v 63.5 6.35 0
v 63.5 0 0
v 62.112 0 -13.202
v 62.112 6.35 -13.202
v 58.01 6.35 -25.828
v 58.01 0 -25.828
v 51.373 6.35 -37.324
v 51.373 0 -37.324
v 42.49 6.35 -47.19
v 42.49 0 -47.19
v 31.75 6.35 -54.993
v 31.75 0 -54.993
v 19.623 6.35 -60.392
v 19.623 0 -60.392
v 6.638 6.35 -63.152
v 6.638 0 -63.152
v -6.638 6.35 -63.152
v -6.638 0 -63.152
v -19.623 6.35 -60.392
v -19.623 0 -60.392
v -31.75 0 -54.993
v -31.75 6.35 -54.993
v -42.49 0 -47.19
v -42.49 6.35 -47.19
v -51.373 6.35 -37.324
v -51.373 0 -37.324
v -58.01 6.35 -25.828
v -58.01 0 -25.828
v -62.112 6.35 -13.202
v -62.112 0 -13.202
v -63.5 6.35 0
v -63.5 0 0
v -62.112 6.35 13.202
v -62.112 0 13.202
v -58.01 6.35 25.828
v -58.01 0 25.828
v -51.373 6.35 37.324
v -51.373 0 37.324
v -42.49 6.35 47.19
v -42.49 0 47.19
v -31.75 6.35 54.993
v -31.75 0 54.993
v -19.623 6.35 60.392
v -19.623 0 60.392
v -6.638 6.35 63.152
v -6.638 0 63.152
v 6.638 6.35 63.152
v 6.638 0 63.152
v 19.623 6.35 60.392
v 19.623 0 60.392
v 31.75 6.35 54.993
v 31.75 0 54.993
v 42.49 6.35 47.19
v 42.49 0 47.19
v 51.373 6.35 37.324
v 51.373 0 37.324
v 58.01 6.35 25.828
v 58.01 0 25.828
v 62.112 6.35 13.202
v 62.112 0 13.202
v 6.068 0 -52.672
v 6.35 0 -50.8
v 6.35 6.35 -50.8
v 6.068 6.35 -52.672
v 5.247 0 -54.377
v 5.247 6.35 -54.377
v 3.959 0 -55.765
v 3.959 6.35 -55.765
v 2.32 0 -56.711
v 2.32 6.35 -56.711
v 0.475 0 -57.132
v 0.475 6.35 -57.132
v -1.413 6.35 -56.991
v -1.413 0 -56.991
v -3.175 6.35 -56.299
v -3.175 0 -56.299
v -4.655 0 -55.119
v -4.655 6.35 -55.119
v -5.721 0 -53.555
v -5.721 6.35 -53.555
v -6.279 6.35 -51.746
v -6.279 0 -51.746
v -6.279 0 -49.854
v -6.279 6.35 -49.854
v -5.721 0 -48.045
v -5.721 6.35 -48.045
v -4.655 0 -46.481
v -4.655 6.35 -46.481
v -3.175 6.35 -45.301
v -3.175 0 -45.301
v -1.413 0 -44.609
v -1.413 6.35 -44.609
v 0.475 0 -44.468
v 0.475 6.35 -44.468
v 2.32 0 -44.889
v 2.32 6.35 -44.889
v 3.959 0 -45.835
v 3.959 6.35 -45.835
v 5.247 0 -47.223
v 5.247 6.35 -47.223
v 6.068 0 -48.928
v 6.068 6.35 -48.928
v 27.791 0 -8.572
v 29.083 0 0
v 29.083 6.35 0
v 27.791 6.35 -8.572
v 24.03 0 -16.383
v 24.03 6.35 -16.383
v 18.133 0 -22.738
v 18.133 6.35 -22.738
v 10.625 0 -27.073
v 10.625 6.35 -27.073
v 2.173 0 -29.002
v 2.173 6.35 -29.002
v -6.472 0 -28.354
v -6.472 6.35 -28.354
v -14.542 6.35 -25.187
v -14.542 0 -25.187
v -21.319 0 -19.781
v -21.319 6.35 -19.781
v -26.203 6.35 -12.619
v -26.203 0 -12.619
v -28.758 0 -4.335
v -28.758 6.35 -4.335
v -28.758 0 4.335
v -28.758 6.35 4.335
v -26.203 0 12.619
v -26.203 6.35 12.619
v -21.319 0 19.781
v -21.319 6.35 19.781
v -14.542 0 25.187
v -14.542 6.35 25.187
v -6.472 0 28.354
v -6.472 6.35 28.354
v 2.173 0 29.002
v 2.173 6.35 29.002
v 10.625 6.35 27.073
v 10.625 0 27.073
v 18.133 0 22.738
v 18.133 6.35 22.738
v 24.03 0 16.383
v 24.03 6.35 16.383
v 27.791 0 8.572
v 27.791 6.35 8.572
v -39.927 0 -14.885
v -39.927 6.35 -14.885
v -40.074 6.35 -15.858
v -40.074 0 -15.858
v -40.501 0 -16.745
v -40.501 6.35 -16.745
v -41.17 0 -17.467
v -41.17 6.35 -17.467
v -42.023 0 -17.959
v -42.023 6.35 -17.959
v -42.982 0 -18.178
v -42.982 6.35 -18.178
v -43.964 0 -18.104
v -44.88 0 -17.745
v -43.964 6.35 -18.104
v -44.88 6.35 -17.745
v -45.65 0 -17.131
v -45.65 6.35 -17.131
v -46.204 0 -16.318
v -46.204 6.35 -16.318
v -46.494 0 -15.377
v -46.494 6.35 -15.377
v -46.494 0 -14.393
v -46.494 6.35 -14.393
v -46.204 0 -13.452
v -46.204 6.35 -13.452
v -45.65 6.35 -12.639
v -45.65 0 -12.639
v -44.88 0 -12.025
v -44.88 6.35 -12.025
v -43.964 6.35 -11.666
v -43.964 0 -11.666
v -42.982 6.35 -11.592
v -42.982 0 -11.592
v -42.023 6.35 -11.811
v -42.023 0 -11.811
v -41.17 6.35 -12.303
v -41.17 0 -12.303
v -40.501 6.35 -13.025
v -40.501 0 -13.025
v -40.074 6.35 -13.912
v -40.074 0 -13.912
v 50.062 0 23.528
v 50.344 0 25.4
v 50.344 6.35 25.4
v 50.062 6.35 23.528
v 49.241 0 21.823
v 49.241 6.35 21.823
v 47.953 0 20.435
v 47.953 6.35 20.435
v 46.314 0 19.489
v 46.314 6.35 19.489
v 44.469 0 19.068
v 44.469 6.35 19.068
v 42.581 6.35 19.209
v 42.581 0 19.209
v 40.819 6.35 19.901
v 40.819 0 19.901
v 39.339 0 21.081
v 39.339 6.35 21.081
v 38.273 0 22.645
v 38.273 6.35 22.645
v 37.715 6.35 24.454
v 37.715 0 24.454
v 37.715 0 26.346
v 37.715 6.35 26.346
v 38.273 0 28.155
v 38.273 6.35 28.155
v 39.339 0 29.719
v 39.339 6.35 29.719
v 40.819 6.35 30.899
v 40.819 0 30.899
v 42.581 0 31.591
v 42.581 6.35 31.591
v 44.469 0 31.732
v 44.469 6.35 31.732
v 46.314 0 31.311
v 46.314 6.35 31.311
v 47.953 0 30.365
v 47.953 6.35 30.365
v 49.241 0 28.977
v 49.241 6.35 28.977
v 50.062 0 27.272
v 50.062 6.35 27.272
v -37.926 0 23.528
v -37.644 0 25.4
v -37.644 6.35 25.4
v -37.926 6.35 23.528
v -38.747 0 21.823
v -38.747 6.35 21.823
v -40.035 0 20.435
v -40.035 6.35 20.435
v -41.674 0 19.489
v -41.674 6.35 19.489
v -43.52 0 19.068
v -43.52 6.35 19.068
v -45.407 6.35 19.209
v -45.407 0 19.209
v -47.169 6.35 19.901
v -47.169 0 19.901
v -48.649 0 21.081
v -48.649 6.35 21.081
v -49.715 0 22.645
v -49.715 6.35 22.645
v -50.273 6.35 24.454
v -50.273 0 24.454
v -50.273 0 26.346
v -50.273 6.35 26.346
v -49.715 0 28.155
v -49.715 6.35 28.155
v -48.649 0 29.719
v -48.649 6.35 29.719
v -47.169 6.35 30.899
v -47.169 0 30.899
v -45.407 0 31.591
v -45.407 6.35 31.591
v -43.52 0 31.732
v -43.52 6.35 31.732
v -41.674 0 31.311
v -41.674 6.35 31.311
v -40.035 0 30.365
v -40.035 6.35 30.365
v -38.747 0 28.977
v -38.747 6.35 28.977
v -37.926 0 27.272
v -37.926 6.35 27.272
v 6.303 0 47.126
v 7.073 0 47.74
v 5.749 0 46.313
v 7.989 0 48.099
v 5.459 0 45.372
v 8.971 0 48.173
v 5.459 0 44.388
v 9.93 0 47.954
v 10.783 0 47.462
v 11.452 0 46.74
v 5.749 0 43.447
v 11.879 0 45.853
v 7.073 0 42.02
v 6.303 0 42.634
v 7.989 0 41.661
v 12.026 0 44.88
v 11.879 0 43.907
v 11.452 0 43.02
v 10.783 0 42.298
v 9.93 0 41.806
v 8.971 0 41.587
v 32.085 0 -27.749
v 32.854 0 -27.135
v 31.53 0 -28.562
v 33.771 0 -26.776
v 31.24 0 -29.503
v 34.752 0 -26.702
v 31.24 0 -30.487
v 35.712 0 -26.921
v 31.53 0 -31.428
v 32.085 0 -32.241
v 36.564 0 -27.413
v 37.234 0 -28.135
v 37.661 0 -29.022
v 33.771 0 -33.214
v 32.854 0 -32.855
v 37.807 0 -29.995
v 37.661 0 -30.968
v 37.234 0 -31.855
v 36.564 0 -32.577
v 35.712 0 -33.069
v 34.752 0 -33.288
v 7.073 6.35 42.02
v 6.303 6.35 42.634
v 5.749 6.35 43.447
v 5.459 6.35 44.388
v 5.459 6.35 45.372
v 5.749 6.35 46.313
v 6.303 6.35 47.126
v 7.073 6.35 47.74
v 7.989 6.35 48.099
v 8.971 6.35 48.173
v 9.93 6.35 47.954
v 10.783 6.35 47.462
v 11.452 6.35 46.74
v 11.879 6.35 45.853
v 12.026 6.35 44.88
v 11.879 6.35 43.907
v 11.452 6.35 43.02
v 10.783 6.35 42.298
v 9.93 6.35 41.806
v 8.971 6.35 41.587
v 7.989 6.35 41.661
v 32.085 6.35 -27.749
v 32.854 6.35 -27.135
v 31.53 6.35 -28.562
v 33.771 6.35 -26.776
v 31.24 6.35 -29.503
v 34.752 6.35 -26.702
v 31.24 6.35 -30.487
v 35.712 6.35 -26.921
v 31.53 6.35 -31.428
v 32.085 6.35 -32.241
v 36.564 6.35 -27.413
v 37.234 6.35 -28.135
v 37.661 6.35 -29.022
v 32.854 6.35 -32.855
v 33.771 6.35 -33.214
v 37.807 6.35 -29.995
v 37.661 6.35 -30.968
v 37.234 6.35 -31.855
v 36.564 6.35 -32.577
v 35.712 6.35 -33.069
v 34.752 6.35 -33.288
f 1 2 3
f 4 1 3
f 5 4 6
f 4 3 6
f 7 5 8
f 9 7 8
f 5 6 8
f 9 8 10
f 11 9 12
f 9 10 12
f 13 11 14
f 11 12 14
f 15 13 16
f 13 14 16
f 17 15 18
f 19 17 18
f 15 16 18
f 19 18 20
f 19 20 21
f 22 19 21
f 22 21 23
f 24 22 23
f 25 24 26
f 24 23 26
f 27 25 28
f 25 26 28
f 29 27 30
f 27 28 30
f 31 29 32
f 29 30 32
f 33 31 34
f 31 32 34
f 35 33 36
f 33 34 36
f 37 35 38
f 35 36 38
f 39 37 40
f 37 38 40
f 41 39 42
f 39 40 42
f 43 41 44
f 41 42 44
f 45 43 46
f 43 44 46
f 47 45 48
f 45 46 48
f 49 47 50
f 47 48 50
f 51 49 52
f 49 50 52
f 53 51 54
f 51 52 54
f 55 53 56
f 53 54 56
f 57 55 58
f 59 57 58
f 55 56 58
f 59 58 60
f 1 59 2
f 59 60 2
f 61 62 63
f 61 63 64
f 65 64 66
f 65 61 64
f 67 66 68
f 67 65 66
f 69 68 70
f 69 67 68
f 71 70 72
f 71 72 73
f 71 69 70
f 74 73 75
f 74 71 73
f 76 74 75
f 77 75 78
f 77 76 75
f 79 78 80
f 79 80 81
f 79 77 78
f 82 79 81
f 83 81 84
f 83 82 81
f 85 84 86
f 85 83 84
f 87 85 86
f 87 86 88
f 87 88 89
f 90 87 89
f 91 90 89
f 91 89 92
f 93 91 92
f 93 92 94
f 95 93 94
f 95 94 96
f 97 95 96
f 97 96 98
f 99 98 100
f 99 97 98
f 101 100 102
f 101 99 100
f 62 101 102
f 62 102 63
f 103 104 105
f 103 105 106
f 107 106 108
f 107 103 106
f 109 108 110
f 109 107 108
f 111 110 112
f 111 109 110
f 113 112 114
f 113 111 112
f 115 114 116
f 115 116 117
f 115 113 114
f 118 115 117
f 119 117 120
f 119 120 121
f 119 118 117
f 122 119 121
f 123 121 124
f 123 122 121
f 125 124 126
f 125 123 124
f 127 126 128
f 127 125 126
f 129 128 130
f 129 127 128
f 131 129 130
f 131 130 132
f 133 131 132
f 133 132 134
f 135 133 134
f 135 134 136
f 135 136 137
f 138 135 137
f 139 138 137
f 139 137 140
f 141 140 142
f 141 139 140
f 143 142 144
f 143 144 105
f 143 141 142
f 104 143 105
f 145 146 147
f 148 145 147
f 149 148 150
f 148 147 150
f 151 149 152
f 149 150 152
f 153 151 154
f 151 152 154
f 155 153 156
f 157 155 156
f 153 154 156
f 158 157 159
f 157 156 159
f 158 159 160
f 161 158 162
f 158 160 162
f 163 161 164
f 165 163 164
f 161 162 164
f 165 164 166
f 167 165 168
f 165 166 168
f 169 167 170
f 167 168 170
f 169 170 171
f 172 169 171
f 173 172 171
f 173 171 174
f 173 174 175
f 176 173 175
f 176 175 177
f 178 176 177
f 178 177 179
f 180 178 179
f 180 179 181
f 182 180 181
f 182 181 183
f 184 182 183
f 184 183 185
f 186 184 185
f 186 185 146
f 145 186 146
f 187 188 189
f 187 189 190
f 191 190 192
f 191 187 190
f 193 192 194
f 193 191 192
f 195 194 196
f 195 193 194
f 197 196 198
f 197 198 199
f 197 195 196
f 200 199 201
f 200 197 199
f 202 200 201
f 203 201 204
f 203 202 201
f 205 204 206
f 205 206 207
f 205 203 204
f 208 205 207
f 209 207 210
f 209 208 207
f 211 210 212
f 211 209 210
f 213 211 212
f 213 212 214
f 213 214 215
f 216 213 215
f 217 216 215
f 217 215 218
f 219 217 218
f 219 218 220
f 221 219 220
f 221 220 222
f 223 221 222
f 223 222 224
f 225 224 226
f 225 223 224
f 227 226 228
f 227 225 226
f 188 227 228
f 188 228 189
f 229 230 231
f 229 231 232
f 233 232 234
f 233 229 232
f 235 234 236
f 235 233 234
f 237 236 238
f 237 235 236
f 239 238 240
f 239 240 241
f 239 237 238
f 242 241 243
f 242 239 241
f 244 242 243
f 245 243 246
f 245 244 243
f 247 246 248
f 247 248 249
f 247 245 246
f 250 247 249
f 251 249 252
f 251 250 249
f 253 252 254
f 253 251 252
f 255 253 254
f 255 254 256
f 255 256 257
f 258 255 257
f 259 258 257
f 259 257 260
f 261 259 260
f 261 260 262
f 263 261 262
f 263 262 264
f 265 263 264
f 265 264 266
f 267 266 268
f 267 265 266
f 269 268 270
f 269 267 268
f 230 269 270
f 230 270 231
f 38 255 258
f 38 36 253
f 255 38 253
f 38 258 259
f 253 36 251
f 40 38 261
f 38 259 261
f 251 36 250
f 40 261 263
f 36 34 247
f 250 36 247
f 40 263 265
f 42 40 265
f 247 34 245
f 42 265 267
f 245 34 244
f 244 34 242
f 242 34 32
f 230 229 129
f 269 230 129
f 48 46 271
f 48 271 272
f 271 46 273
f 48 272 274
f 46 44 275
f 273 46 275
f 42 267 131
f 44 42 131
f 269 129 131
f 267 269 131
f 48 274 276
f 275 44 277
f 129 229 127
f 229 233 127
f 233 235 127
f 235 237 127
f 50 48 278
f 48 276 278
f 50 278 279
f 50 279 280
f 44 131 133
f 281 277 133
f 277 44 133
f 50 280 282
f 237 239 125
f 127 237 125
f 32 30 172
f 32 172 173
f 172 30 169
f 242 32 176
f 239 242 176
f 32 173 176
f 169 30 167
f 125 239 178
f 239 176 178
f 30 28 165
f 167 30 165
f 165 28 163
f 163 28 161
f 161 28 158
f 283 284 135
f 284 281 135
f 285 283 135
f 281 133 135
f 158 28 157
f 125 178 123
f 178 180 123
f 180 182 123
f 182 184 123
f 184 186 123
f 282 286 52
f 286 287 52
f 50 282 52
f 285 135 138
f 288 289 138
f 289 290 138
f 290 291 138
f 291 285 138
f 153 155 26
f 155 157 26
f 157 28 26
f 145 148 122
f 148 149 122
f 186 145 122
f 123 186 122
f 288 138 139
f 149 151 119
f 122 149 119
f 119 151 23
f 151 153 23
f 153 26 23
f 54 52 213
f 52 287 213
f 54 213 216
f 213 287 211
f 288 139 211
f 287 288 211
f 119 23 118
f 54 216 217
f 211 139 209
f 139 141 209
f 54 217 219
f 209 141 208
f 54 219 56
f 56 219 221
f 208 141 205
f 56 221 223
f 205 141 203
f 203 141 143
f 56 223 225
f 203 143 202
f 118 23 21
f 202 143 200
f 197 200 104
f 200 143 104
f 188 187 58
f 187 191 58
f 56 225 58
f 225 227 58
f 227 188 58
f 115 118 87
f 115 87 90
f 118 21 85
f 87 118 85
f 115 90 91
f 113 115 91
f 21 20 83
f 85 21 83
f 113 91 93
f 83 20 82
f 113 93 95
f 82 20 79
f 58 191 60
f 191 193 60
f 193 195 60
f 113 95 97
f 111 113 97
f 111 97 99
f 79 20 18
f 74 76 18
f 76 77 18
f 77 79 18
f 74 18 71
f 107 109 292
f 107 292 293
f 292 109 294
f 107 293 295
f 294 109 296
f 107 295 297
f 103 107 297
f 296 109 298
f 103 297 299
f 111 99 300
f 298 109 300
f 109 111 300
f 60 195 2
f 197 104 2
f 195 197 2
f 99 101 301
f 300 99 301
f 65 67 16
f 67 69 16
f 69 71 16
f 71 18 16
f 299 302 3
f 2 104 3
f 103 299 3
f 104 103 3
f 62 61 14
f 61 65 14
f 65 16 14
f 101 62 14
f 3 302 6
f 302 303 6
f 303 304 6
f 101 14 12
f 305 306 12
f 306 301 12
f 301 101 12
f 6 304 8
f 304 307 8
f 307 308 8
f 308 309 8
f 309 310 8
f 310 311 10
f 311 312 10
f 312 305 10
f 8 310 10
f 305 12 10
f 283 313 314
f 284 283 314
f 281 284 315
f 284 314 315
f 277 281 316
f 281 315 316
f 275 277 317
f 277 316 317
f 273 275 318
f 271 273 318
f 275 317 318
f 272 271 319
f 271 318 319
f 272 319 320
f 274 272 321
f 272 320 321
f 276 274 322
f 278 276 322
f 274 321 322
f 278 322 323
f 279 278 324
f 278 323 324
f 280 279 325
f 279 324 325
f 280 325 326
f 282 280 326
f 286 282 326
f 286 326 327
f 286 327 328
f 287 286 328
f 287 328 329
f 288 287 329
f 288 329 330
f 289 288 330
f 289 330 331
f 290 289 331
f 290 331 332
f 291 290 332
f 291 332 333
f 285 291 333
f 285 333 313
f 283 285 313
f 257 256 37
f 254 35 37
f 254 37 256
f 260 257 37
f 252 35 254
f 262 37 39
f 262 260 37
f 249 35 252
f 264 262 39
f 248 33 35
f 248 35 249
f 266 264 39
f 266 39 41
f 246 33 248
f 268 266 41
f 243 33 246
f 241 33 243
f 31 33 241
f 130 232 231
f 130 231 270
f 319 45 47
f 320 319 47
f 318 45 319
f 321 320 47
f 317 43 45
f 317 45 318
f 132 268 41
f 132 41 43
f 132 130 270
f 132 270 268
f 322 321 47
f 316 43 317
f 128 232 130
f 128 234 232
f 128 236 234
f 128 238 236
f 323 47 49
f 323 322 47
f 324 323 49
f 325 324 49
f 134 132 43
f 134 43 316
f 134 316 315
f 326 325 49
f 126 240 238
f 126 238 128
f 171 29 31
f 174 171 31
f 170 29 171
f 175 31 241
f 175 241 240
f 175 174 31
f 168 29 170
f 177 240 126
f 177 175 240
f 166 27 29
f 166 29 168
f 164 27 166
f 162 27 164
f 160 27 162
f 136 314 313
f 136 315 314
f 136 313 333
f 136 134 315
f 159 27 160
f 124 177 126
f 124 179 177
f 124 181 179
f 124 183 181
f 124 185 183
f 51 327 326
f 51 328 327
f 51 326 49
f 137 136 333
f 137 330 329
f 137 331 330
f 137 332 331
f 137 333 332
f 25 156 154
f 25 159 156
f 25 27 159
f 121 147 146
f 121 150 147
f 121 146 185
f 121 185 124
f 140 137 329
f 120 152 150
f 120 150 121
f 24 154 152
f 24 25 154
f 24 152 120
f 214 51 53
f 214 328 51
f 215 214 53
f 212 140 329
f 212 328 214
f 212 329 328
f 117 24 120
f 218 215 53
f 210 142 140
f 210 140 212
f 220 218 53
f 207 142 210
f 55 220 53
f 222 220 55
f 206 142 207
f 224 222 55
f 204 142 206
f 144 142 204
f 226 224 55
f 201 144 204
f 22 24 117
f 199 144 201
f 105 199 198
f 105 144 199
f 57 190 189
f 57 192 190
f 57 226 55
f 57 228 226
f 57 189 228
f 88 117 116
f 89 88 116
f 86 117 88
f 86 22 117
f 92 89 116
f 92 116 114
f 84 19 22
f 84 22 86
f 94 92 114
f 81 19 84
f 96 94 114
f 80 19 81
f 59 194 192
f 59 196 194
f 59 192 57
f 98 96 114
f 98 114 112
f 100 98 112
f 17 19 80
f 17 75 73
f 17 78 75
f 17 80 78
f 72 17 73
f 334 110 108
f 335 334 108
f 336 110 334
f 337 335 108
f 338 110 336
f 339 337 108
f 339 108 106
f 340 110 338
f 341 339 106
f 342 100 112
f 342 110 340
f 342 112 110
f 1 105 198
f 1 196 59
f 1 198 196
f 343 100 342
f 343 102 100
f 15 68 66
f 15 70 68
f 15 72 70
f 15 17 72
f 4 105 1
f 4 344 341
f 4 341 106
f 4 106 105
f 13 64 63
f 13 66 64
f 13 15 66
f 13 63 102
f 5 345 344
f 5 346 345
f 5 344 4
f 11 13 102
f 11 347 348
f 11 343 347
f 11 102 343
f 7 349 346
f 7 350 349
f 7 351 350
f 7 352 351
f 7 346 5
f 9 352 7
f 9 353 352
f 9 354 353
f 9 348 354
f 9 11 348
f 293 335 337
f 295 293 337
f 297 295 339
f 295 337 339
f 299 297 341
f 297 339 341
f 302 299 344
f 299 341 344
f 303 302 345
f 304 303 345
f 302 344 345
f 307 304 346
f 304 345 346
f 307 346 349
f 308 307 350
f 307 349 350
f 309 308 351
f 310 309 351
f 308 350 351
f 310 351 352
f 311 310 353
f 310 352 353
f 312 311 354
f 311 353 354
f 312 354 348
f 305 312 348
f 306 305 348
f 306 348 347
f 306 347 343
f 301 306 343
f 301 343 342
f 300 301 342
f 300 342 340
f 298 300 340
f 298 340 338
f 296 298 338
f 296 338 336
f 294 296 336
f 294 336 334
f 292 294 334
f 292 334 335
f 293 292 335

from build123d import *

# Parameters (mm, degrees)
SKETCH1_R           = 63.5
SKETCH1_R_2         = 29.083
SKETCH1_R_3         = 6.35
BOSS_EXTRUDE1_DEPTH = 6.35
SKETCH5_R           = 3.302
CUT_EXTRUDE4_DEPTH  = 7.35
CIRPATTERN2_COUNT   = 3


with BuildPart() as part:
    # Sketch1 → Boss-Extrude1 (new body)
    with BuildSketch(Plane(origin=(0, 0, 0), x_dir=(1, 0, 0), z_dir=(0, 1, 0))):
        Circle(SKETCH1_R)
        Circle(SKETCH1_R_2, mode=Mode.SUBTRACT)
        with Locations((0, 50.8)):
            Circle(SKETCH1_R_3, mode=Mode.SUBTRACT)
        with Locations((43.994090512, -25.4)):
            Circle(SKETCH1_R_3, mode=Mode.SUBTRACT)
        with Locations((-43.994090512, -25.4)):
            Circle(SKETCH1_R_3, mode=Mode.SUBTRACT)
    extrude(amount=BOSS_EXTRUDE1_DEPTH)

    # Sketch5 → Cut-Extrude4 (cut, through all)
    with BuildSketch(Plane(origin=(0, 6.35, 0), x_dir=(1, 0, 0), z_dir=(0, 1, 0))):
        with Locations((-43.229109276, 14.884976022)):
            Circle(SKETCH5_R)
    cut_extrude4 = extrude(amount=-CUT_EXTRUDE4_DEPTH, mode=Mode.SUBTRACT)

    # CirPattern2: Cut-Extrude4 ×3 about axis
    cirpattern2_axis = Axis((0, 0, 0), (0, 1, 0))
    for i in range(1, CIRPATTERN2_COUNT):
        add(cut_extrude4.rotate(cirpattern2_axis, i * 360 / CIRPATTERN2_COUNT), mode=Mode.SUBTRACT)


solid = part.part
